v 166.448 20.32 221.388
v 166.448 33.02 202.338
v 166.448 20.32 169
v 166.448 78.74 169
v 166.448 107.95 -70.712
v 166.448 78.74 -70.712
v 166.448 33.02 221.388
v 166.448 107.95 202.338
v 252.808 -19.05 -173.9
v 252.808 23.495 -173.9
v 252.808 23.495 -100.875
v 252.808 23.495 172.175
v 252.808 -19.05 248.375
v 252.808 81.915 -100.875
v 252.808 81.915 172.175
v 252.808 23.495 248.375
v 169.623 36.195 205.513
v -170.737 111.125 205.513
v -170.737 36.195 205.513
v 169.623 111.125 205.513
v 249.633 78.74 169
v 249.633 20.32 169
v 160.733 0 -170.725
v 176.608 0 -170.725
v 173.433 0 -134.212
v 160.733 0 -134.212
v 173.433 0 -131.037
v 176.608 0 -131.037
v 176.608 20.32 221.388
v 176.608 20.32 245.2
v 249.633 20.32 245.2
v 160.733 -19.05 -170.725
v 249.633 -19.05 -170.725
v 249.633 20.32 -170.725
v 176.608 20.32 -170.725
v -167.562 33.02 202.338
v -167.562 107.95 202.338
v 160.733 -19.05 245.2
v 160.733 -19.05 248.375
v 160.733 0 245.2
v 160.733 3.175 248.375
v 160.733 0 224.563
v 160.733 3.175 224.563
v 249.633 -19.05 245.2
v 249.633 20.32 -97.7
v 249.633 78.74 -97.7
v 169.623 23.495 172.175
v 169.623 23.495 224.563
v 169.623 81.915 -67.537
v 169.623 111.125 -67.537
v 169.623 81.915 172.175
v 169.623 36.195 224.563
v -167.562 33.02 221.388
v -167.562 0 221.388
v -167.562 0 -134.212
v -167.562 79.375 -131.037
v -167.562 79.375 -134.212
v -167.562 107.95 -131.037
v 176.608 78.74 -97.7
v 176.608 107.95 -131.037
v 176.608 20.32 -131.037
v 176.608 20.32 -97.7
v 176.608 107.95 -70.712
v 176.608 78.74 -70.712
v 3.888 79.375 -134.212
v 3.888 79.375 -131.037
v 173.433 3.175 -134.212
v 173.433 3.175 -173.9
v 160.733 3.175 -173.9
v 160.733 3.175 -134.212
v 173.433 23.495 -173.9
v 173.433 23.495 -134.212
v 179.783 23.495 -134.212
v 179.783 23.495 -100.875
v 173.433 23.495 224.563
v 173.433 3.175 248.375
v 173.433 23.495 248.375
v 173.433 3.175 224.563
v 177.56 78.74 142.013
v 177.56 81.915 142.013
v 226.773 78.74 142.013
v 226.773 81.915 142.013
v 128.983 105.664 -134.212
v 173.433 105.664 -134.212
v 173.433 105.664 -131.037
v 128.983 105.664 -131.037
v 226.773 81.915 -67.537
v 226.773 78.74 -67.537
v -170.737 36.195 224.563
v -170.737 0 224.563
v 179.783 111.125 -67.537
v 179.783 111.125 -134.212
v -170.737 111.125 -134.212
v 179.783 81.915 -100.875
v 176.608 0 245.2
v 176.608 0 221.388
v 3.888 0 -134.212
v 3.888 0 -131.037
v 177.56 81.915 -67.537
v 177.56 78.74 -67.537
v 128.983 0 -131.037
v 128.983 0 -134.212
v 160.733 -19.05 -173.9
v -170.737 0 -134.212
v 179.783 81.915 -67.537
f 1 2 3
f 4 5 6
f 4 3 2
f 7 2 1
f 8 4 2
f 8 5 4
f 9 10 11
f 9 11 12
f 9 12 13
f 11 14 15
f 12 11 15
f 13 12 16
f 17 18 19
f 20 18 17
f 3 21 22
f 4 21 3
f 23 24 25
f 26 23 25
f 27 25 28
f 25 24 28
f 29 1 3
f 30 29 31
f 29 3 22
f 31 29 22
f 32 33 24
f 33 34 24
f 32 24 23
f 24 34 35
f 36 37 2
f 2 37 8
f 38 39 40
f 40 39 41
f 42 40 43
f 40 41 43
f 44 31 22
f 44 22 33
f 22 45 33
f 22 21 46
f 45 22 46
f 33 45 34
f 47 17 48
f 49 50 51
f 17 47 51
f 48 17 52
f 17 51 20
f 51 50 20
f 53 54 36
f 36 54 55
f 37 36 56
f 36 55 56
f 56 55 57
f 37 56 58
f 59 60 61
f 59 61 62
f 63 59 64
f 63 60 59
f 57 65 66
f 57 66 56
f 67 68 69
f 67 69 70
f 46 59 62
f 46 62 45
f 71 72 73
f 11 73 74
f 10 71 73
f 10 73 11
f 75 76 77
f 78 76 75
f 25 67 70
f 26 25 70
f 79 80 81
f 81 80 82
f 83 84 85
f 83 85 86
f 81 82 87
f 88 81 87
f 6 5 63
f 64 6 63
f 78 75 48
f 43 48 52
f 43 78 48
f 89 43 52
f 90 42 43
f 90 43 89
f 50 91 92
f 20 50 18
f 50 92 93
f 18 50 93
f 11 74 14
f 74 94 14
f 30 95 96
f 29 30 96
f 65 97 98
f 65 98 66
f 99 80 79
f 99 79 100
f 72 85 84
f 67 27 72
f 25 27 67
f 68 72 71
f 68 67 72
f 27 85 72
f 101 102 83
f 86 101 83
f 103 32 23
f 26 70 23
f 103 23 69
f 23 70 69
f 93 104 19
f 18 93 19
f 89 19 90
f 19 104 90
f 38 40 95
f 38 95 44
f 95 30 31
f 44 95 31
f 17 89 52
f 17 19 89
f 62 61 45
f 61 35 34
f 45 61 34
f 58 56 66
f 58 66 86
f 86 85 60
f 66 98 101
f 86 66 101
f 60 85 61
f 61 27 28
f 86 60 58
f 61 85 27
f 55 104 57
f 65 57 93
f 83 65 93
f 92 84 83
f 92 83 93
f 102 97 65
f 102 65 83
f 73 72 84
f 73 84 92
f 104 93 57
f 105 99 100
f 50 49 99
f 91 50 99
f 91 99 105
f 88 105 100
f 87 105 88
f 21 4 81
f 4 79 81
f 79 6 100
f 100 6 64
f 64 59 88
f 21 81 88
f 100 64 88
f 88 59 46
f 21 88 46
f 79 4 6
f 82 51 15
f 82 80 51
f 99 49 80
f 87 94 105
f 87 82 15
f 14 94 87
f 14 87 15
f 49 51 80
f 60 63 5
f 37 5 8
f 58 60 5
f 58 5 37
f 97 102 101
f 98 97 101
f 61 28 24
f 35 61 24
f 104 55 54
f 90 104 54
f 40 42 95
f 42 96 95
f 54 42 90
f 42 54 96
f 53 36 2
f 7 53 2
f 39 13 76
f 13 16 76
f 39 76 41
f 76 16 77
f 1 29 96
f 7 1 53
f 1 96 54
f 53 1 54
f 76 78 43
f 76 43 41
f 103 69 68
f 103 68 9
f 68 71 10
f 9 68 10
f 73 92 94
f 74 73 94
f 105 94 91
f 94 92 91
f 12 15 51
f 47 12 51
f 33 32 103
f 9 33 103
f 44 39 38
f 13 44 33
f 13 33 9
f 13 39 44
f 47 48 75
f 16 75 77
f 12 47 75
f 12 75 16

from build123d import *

# Parameters (mm, degrees)
HV_TOP_PANEL_DEPTH                   = 107.95
SKETCH10_W                           = 73.025
SKETCH10_H                           = 415.925
INTERFACE_WITH_BACK_COVER_DEPTH      = 78.74
SKETCH11_W                           = 334.01
SKETCH11_H                           = 19.05
INTEFACE_WITH_MOTOR_DISCONNECT_DEPTH = 74.93
CUT_EXTRUDE6_DEPTH                   = 87.63
SKETCH14_W                           = 10.16
SKETCH14_H                           = 239.7125
CUT_EXTRUDE3_DEPTH                   = 29.21
SHELL1_T                             = 3.175
SKETCH17_W                           = 39.6875
SKETCH17_H                           = 3.175
SKETCH17_W_2                         = 23.8125
OVERLAP_ON_LID_DEPTH                 = 12.7
LIP_DEPTH                            = 19.05
SKETCH18_W                           = 49.2125
SKETCH18_H                           = 209.55
MOTOR_DISCONNECT_DEPTH               = 7.62
SKETCH19_W                           = 44.45
SKETCH19_H                           = 105.664
SKETCH19_W_2                         = 171.45
SKETCH19_H_2                         = 79.375
LV_AND_HV_PANELS_DEPTH               = 7.62


with BuildPart() as part:
    # Sketch4 → HV Top Panel (new body)
    with BuildSketch(Plane(origin=(0, 0, 0), x_dir=(1, 0, 0), z_dir=(0, 1, 0))):
        Polygon((176.607773845, -221.387726412), (-167.562226155, -221.387726412), (-167.562226155, -219.800226412), (-167.562226155, 131.037273588), (176.607773845, 131.037273588), align=None)
    extrude(amount=HV_TOP_PANEL_DEPTH)

    # Sketch10 → Interface with Back Cover (add)
    with BuildSketch(Plane(origin=(0, 0, 0), x_dir=(1, 0, 0), z_dir=(0, 1, 0))):
        with Locations((213.120273845, -37.237726412)):
            Rectangle(SKETCH10_W, SKETCH10_H)
    extrude(amount=INTERFACE_WITH_BACK_COVER_DEPTH)

    # Sketch11 → Inteface with Motor Disconnect (cut)
    with BuildSketch(Plane(origin=(0, 107.95, 0), x_dir=(1, 0, 0), z_dir=(0, 1, 0))):
        with Locations((-0.557226155, -211.862726412)):
            Rectangle(SKETCH11_W, SKETCH11_H)
    extrude(amount=-INTEFACE_WITH_MOTOR_DISCONNECT_DEPTH, mode=Mode.SUBTRACT)

    # Sketch11<3> → Cut-Extrude6 (cut)
    with BuildSketch(Plane(origin=(0, 107.95, 0), x_dir=(1, 0, 0), z_dir=(0, 1, 0))):
        Polygon((166.447773845, -245.200226412), (249.632773845, -245.200226412), (249.632773845, -169.000226412), (176.607773845, -169.000226412), (176.607773845, -221.387726412), (166.447773845, -221.387726412), align=None)
        Polygon((166.447773845, -202.337726412), (166.447773845, -221.387726412), (176.607773845, -221.387726412), (176.607773845, -169.000226412), (166.447773845, -169.000226412), align=None)
        Polygon((176.607773845, 131.037273588), (176.607773845, 97.699773588), (249.632773845, 97.699773588), (249.632773845, 170.724773588), (176.607773845, 170.724773588), align=None)
    extrude(amount=-CUT_EXTRUDE6_DEPTH, mode=Mode.SUBTRACT)

    # Sketch14 → Cut-Extrude3 (cut)
    with BuildSketch(Plane(origin=(0, 107.95, 0), x_dir=(1, 0, 0), z_dir=(0, 1, 0))):
        with Locations((171.527773845, -49.143976412)):
            Rectangle(SKETCH14_W, SKETCH14_H)
    extrude(amount=-CUT_EXTRUDE3_DEPTH, mode=Mode.SUBTRACT)

    # Shell1
    shell1_openings = [part.faces().sort_by_distance(p)[0] for p in [
        (46.296622828, 0, 43.585658338),
    ]]
    offset(amount=SHELL1_T, openings=shell1_openings, kind=Kind.INTERSECTION)

    # Sketch17 → Overlap on Lid (add)
    with BuildSketch(Plane.ZY.offset(-173.432773845)):
        with Locations((-154.056023588, 1.5875)):
            Rectangle(SKETCH17_W, SKETCH17_H)
        with Locations((236.468976412, 1.5875)):
            Rectangle(SKETCH17_W_2, SKETCH17_H)
    extrude(amount=OVERLAP_ON_LID_DEPTH)

    # Sketch15 → Lip (add)
    with BuildSketch(Plane.XZ):
        Polygon((249.632773845, 245.200226412), (249.632773845, -170.724773588), (176.607773845, -170.724773588), (160.732773845, -170.724773588), (160.732773845, -173.899773588), (252.807773845, -173.899773588), (252.807773845, 248.375226412), (160.732773845, 248.375226412), (160.732773845, 245.200226412), (176.607773845, 245.200226412), align=None)
    extrude(amount=LIP_DEPTH)

    # Sketch18 → Motor Disconnect (cut)
    with BuildSketch(Plane(origin=(0, 81.915, 0), x_dir=(1, 0, 0), z_dir=(0, 1, 0))):
        with Locations((202.166523845, -37.237726412)):
            Rectangle(SKETCH18_W, SKETCH18_H)
    extrude(amount=-MOTOR_DISCONNECT_DEPTH, mode=Mode.SUBTRACT)

    # Sketch19 → LV and HV Panels (cut)
    with BuildSketch(Plane(origin=(0, 0, -134.212273588), x_dir=(-1, 0, 0), z_dir=(0, 0, -1))):
        with Locations((-151.207773845, 52.832)):
            Rectangle(SKETCH19_W, SKETCH19_H)
        with Locations((81.837226155, 39.6875)):
            Rectangle(SKETCH19_W_2, SKETCH19_H_2)
    extrude(amount=-LV_AND_HV_PANELS_DEPTH, mode=Mode.SUBTRACT)


solid = part.part
